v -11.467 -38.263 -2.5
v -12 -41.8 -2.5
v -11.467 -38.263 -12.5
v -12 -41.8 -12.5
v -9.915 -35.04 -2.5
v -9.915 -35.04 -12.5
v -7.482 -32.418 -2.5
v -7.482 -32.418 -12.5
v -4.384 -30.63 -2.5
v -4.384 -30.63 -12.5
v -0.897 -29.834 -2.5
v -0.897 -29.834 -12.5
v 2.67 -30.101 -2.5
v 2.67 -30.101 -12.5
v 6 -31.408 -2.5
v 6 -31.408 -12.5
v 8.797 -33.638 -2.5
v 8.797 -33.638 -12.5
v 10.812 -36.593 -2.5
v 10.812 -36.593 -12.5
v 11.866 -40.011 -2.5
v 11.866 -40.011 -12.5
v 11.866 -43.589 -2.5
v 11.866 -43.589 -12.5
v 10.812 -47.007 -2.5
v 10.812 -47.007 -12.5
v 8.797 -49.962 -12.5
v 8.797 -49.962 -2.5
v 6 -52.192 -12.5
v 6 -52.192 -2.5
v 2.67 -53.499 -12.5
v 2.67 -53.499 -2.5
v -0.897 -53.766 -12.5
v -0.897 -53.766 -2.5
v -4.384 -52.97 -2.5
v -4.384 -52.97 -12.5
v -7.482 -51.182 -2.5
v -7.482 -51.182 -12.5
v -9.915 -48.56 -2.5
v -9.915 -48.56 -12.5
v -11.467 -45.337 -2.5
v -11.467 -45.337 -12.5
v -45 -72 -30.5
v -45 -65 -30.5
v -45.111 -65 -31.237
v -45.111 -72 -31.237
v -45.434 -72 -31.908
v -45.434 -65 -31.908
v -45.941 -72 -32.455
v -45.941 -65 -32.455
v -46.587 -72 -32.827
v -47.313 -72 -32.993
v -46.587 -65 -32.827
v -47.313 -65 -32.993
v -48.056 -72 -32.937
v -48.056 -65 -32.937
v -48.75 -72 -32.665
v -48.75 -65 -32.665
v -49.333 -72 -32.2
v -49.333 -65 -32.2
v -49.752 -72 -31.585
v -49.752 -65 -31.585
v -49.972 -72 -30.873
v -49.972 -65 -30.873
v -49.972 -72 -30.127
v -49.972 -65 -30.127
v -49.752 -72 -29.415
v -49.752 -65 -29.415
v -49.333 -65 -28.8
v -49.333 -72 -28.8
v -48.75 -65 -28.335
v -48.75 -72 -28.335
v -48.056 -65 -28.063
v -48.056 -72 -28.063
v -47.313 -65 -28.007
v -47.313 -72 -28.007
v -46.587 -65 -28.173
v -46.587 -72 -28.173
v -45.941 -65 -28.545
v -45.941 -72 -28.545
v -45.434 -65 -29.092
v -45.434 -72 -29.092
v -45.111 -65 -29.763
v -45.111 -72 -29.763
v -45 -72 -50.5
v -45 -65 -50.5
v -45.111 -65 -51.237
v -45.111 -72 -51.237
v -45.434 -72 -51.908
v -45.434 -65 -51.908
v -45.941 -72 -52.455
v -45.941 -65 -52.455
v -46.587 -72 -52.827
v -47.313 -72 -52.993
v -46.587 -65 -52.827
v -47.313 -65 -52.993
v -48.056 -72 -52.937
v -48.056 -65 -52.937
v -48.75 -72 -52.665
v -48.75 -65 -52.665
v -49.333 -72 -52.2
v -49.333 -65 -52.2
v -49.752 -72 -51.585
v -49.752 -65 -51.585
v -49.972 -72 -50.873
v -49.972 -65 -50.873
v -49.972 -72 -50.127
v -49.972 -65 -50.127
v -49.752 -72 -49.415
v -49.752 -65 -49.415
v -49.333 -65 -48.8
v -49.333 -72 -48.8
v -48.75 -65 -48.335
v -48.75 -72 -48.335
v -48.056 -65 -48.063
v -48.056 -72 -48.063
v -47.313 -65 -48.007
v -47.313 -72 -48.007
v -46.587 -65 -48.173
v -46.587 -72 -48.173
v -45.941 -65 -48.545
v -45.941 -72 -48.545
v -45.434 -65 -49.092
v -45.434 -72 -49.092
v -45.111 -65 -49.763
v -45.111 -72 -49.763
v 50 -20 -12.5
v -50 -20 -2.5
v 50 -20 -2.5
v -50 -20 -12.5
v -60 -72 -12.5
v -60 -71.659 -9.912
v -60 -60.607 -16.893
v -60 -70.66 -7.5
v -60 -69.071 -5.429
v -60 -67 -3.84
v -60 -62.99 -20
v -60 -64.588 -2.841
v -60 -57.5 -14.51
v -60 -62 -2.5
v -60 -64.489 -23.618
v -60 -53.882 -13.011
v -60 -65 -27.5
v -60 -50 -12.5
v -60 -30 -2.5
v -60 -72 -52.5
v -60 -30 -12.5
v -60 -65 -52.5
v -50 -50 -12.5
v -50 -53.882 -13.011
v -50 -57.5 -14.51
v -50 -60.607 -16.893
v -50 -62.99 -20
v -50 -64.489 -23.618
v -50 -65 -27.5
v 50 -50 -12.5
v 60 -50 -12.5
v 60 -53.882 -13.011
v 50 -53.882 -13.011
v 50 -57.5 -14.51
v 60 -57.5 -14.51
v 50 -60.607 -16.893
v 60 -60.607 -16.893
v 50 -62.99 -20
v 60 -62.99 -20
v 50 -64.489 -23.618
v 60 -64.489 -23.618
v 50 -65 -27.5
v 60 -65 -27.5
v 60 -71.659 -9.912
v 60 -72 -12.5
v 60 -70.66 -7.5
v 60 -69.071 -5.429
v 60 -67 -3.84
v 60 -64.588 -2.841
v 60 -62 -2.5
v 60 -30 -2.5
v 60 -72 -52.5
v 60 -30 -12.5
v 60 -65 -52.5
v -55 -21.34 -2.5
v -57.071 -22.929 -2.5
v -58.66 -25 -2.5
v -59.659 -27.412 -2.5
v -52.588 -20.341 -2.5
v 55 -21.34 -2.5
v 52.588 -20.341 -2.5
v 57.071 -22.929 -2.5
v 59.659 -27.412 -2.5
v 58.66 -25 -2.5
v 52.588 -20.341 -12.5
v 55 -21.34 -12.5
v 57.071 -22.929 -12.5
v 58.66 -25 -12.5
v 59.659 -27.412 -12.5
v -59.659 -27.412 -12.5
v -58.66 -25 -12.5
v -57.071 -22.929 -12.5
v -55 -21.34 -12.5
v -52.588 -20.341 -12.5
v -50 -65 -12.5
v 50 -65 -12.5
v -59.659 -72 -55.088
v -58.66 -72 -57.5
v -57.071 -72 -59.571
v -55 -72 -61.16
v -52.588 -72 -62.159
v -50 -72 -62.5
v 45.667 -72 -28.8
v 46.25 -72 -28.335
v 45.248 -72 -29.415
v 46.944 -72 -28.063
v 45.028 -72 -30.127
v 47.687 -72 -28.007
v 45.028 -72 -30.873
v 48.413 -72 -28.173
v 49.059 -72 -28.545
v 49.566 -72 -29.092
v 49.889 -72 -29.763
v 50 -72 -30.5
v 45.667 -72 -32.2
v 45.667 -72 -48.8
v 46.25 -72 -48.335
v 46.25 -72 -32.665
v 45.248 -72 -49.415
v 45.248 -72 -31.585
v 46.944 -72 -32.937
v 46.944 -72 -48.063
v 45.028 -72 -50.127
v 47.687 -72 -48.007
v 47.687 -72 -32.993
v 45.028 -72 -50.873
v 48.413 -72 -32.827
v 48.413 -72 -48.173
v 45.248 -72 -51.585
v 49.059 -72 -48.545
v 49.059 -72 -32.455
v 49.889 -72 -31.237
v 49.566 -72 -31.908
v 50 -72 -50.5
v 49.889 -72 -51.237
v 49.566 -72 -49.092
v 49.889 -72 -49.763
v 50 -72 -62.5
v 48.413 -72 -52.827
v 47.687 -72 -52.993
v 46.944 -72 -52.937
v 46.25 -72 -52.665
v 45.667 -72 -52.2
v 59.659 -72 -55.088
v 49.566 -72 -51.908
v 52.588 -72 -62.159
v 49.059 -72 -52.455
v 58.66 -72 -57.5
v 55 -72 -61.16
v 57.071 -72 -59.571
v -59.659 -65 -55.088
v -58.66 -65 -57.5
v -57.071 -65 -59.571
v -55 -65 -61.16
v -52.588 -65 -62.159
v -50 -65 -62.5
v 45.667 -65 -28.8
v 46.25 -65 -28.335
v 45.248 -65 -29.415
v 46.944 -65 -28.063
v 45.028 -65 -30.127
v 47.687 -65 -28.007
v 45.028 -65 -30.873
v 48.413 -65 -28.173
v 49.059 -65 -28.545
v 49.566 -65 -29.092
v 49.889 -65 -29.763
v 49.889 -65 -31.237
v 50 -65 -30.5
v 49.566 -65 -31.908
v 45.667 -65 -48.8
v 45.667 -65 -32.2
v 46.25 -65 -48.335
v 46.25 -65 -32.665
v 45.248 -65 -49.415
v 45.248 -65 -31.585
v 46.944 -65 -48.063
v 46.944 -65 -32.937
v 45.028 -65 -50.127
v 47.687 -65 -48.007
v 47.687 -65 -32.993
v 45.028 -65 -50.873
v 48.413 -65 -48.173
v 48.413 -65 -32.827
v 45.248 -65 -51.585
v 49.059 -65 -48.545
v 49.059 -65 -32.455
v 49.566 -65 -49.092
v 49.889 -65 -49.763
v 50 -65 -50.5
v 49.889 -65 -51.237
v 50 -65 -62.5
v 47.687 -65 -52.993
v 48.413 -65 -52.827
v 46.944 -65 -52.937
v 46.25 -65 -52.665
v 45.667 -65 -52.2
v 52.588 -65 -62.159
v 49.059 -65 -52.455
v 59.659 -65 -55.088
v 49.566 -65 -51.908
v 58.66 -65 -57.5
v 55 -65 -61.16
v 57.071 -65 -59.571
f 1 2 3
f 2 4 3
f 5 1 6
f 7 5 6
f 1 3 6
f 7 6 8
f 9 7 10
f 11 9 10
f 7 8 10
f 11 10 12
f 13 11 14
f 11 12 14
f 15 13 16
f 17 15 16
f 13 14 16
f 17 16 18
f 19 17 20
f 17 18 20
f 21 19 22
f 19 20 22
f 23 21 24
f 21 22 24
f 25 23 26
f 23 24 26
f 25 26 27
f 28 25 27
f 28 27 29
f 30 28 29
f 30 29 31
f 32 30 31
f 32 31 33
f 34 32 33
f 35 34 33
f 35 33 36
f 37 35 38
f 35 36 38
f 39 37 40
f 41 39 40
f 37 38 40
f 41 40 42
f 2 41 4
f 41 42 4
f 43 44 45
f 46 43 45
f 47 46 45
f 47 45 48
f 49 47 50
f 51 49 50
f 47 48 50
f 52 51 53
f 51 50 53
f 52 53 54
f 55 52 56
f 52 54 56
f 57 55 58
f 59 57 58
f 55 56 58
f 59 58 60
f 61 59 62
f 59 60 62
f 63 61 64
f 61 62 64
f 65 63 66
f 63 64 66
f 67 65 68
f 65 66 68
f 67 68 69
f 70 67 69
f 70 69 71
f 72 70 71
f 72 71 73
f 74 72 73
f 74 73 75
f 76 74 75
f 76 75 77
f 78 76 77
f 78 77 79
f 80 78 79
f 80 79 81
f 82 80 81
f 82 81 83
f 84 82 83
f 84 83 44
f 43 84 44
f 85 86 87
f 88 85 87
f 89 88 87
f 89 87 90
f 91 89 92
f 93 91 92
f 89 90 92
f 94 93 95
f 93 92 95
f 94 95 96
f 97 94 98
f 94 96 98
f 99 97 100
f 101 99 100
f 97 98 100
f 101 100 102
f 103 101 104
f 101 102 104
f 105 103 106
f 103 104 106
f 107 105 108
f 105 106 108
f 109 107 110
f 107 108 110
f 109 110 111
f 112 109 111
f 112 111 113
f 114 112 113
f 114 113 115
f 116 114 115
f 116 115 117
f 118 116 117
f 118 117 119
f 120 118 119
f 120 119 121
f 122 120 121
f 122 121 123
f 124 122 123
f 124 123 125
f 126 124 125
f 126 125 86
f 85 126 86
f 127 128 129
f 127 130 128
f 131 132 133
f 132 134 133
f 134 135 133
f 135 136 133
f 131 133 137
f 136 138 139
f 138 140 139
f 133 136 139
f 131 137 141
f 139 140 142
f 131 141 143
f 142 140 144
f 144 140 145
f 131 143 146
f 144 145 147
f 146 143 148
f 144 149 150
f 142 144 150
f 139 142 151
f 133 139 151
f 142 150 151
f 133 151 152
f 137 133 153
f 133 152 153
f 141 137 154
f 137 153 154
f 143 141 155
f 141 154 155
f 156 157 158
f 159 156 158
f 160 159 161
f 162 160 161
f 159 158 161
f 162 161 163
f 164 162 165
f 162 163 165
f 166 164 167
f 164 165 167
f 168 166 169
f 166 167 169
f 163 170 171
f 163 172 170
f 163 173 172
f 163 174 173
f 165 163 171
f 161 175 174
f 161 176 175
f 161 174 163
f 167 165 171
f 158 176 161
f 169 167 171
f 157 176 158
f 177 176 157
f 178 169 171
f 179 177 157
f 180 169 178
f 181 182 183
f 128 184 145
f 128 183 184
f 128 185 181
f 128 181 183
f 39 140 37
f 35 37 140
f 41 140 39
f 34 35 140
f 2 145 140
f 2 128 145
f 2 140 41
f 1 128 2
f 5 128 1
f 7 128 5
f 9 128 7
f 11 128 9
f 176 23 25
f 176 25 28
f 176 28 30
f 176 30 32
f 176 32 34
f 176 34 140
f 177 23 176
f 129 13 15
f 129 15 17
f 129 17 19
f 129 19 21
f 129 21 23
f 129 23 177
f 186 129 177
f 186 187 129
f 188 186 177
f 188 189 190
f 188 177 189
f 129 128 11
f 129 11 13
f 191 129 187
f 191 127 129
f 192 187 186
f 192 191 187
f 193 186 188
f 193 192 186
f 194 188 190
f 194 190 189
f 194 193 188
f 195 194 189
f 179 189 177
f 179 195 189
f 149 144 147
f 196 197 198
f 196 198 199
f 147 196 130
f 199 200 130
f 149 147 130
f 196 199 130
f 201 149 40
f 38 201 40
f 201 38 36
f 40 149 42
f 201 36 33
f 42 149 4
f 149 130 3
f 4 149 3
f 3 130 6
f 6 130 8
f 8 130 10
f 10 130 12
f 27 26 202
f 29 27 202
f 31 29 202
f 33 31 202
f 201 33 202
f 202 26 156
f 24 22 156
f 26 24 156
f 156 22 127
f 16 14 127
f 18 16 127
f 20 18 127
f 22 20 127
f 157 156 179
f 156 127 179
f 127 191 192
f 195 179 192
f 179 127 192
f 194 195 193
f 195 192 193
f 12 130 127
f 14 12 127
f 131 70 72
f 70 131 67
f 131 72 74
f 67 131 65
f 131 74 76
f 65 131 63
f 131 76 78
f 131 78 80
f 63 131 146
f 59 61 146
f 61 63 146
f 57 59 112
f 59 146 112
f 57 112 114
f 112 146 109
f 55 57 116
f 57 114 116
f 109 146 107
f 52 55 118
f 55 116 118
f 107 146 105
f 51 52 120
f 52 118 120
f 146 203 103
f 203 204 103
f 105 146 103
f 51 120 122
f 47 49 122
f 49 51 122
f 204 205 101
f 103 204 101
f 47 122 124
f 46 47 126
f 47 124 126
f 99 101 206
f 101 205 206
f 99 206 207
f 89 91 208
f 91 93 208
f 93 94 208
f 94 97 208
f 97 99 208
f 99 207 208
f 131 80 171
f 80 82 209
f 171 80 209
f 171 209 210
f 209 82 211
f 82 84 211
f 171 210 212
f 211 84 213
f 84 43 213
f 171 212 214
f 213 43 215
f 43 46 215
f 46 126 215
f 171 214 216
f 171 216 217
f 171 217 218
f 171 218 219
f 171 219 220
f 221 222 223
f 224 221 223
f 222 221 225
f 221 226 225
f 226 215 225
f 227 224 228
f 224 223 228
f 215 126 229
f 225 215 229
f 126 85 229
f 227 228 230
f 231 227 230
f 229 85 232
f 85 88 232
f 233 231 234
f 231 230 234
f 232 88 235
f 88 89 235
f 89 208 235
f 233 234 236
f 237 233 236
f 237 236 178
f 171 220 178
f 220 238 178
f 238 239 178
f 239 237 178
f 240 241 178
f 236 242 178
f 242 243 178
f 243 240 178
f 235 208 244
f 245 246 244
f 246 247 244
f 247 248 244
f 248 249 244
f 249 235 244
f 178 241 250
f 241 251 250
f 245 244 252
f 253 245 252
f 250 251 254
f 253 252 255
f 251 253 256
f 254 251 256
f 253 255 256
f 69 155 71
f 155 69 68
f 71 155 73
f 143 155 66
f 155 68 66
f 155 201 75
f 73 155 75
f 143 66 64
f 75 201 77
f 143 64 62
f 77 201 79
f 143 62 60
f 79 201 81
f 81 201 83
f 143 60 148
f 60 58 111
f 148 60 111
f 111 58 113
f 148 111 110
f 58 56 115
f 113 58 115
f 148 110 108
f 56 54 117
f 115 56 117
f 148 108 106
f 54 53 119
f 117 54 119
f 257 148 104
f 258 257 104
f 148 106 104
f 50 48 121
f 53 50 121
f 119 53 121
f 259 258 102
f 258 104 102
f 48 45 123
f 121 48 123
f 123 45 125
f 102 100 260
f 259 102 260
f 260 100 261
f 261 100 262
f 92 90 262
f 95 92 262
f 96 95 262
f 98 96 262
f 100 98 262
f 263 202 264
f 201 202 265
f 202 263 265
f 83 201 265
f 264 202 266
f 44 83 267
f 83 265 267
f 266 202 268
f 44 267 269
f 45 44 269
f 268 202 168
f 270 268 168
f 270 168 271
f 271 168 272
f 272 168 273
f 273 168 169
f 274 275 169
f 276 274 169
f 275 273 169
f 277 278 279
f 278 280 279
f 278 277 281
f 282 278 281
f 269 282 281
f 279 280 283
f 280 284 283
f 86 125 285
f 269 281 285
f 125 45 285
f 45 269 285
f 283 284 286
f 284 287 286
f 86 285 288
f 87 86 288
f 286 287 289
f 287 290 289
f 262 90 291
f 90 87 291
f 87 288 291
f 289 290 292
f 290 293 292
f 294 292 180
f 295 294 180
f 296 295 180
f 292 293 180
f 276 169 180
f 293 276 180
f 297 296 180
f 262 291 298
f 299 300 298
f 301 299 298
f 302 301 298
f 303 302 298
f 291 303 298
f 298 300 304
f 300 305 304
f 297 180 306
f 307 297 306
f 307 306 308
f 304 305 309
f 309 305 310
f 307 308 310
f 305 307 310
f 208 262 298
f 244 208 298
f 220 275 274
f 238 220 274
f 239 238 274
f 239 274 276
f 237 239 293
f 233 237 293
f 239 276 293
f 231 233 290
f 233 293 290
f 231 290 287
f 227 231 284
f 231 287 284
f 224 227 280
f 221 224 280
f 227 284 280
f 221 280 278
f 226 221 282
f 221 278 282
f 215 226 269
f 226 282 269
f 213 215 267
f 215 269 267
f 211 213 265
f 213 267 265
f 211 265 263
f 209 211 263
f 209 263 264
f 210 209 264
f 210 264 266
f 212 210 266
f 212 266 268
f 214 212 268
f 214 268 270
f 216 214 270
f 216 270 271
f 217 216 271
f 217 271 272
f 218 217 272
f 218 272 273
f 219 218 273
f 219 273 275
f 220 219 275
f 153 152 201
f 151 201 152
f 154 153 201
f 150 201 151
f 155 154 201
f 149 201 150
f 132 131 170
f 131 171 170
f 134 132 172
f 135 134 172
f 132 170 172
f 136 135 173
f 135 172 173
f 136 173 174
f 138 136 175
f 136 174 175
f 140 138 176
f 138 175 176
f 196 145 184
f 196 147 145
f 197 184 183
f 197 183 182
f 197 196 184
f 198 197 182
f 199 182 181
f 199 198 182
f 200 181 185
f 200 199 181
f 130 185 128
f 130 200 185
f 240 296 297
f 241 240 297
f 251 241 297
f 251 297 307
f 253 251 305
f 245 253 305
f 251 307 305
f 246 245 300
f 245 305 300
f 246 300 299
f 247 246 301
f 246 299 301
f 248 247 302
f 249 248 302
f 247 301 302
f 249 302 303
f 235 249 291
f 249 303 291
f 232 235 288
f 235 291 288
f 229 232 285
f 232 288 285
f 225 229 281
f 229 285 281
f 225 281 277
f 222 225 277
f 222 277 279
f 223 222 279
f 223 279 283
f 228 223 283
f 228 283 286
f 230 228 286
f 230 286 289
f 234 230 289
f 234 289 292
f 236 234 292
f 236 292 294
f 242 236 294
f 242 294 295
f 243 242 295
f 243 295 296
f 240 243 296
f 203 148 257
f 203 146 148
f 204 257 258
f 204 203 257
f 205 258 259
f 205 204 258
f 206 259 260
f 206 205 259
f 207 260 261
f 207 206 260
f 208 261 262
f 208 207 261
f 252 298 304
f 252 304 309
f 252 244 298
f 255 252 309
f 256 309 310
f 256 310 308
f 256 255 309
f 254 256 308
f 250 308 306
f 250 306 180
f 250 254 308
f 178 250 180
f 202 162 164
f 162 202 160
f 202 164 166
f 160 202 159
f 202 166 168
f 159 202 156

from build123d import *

# Parameters (mm, degrees)
SKETCH_1_W          = 120
SKETCH_1_H          = 60
EXTRUDE_1_DEPTH     = 62
SKETCH_3_W          = 120
SKETCH_3_H          = 50
CUT_EXTRUDE_1_DEPTH = 40
CUT_EXTRUDE_2_DEPTH = 121
CUT_EXTRUDE_3_DEPTH = 50
SKETCH_7_R          = 12
CUT_EXTRUDE_4_DEPTH = 50
SKETCH_8_W          = 120
SKETCH_8_H          = 10
CUT_EXTRUDE_5_DEPTH = 10
FILLET_1_R          = 10
FILLET_2_R          = 10
FILLET_3_R          = 10
SKETCH_9_R          = 2.5
CUT_EXTRUDE_6_DEPTH = 10


with BuildPart() as part:
    # 草图1 → 凸台-拉伸1 (new body)
    with BuildSketch(Plane(origin=(0, -10, 0), x_dir=(1, 0, 0), z_dir=(0, 1, 0))):
        with Locations((0, 32.5)):
            Rectangle(SKETCH_1_W, SKETCH_1_H)
    extrude(amount=-EXTRUDE_1_DEPTH)

    # 草图3 → 切除-拉伸1 (cut)
    with BuildSketch(Plane(origin=(0, -10, 0), x_dir=(1, 0, 0), z_dir=(0, 1, 0))):
        with Locations((0, 37.5)):
            Rectangle(SKETCH_3_W, SKETCH_3_H)
    extrude(amount=-CUT_EXTRUDE_1_DEPTH, mode=Mode.SUBTRACT)

    # 草图4 → 切除-拉伸2 (cut, through all)
    with BuildSketch(Plane(origin=(60, 0, 0), x_dir=(0, 0, -1), z_dir=(1, 0, 0))):
        with BuildLine():
            Line((27.5, -65), (62.5, -65))
            Line((62.5, -65), (62.5, -50))
            Line((62.5, -50), (12.5, -50))
            ThreePointArc((12.5, -50), (16.893398282, -60.606601718), (27.5, -65))
        make_face()
    extrude(amount=-CUT_EXTRUDE_2_DEPTH, mode=Mode.SUBTRACT)

    # 草图6 → 切除-拉伸3 (cut, symmetric)
    with BuildSketch(Plane(origin=(0, 0, 0), x_dir=(0, 0, -1), z_dir=(1, 0, 0))):
        Polygon((12.5, -50), (12.5, -65), (27.5, -65), align=None)
    extrude(amount=CUT_EXTRUDE_3_DEPTH, both=True, mode=Mode.SUBTRACT)

    # 草图7 → 切除-拉伸4 (cut, symmetric)
    with BuildSketch(Plane(origin=(0, 0, -12.5), x_dir=(-1, 0, 0), z_dir=(0, 0, -1))):
        with Locations((0, -41.8)):
            Circle(SKETCH_7_R)
    extrude(amount=CUT_EXTRUDE_4_DEPTH, both=True, mode=Mode.SUBTRACT)

    # 草图8 → 切除-拉伸5 (cut)
    with BuildSketch(Plane(origin=(0, -10, 0), x_dir=(1, 0, 0), z_dir=(0, 1, 0))):
        with Locations((0, 7.5)):
            Rectangle(SKETCH_8_W, SKETCH_8_H)
    extrude(amount=-CUT_EXTRUDE_5_DEPTH, mode=Mode.SUBTRACT)

    # 圆角1
    fillet_1_edges = [part.edges().sort_by_distance(p)[0] for p in [
        (60, -20, -7.5),
        (-60, -20, -7.5),
    ]]
    fillet(fillet_1_edges, radius=FILLET_1_R)

    # 圆角2
    fillet_2_edges = [part.edges().sort_by_distance(p)[0] for p in [
        (-60, -68.5, -62.5),
        (60, -68.5, -62.5),
    ]]
    fillet(fillet_2_edges, radius=FILLET_2_R)

    # 圆角3
    fillet_3_edges = [part.edges().sort_by_distance(p)[0] for p in [
        (0, -72, -2.5),
    ]]
    fillet(fillet_3_edges, radius=FILLET_3_R)

    # 草图9 → 切除-拉伸6 (cut)
    with BuildSketch(Plane(origin=(0, -65, 0), x_dir=(1, 0, 0), z_dir=(0, 1, 0))):
        with Locations((47.5, 50.5)):
            Circle(SKETCH_9_R)
        with Locations((47.5, 30.5)):
            Circle(SKETCH_9_R)
        with Locations((-47.5, 50.5)):
            Circle(SKETCH_9_R)
        with Locations((-47.5, 30.5)):
            Circle(SKETCH_9_R)
    extrude(amount=-CUT_EXTRUDE_6_DEPTH, mode=Mode.SUBTRACT)


solid = part.part
